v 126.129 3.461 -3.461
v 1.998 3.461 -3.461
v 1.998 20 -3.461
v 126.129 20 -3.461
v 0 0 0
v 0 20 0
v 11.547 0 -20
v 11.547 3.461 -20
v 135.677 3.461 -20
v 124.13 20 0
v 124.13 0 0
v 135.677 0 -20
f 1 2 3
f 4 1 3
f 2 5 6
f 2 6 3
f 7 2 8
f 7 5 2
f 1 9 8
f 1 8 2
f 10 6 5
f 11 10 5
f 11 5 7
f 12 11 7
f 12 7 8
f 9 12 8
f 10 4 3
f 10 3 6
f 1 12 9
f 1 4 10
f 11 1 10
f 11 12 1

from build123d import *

# Parameters (mm, degrees)
BOSS_EXTRUDE1_DEPTH = 240
CUT_EXTRUDE1_DEPTH  = 242.660919472


with BuildPart() as part:
    # Sketch1 → Boss-Extrude1 (new body)
    with BuildSketch(Plane(origin=(0, 0, 0), x_dir=(0, 0, -1), z_dir=(1, 0, 0))):
        Polygon((0, 0), (20, 0), (20, 3.461178467), (3.461178467, 3.461178467), (3.461178467, 20), (0, 20), align=None)
    extrude(amount=BOSS_EXTRUDE1_DEPTH)

    # Sketch2 → Cut-Extrude1 (cut, through all)
    with BuildSketch(Plane.XZ):
        Polygon((0, 0), (11.547005384, -20), (0, -20), align=None)
        Polygon((240, 0), (240, -20), (135.67731326, -20), (124.130307876, 0), align=None)
    extrude(amount=-CUT_EXTRUDE1_DEPTH, mode=Mode.SUBTRACT)


solid = part.part
